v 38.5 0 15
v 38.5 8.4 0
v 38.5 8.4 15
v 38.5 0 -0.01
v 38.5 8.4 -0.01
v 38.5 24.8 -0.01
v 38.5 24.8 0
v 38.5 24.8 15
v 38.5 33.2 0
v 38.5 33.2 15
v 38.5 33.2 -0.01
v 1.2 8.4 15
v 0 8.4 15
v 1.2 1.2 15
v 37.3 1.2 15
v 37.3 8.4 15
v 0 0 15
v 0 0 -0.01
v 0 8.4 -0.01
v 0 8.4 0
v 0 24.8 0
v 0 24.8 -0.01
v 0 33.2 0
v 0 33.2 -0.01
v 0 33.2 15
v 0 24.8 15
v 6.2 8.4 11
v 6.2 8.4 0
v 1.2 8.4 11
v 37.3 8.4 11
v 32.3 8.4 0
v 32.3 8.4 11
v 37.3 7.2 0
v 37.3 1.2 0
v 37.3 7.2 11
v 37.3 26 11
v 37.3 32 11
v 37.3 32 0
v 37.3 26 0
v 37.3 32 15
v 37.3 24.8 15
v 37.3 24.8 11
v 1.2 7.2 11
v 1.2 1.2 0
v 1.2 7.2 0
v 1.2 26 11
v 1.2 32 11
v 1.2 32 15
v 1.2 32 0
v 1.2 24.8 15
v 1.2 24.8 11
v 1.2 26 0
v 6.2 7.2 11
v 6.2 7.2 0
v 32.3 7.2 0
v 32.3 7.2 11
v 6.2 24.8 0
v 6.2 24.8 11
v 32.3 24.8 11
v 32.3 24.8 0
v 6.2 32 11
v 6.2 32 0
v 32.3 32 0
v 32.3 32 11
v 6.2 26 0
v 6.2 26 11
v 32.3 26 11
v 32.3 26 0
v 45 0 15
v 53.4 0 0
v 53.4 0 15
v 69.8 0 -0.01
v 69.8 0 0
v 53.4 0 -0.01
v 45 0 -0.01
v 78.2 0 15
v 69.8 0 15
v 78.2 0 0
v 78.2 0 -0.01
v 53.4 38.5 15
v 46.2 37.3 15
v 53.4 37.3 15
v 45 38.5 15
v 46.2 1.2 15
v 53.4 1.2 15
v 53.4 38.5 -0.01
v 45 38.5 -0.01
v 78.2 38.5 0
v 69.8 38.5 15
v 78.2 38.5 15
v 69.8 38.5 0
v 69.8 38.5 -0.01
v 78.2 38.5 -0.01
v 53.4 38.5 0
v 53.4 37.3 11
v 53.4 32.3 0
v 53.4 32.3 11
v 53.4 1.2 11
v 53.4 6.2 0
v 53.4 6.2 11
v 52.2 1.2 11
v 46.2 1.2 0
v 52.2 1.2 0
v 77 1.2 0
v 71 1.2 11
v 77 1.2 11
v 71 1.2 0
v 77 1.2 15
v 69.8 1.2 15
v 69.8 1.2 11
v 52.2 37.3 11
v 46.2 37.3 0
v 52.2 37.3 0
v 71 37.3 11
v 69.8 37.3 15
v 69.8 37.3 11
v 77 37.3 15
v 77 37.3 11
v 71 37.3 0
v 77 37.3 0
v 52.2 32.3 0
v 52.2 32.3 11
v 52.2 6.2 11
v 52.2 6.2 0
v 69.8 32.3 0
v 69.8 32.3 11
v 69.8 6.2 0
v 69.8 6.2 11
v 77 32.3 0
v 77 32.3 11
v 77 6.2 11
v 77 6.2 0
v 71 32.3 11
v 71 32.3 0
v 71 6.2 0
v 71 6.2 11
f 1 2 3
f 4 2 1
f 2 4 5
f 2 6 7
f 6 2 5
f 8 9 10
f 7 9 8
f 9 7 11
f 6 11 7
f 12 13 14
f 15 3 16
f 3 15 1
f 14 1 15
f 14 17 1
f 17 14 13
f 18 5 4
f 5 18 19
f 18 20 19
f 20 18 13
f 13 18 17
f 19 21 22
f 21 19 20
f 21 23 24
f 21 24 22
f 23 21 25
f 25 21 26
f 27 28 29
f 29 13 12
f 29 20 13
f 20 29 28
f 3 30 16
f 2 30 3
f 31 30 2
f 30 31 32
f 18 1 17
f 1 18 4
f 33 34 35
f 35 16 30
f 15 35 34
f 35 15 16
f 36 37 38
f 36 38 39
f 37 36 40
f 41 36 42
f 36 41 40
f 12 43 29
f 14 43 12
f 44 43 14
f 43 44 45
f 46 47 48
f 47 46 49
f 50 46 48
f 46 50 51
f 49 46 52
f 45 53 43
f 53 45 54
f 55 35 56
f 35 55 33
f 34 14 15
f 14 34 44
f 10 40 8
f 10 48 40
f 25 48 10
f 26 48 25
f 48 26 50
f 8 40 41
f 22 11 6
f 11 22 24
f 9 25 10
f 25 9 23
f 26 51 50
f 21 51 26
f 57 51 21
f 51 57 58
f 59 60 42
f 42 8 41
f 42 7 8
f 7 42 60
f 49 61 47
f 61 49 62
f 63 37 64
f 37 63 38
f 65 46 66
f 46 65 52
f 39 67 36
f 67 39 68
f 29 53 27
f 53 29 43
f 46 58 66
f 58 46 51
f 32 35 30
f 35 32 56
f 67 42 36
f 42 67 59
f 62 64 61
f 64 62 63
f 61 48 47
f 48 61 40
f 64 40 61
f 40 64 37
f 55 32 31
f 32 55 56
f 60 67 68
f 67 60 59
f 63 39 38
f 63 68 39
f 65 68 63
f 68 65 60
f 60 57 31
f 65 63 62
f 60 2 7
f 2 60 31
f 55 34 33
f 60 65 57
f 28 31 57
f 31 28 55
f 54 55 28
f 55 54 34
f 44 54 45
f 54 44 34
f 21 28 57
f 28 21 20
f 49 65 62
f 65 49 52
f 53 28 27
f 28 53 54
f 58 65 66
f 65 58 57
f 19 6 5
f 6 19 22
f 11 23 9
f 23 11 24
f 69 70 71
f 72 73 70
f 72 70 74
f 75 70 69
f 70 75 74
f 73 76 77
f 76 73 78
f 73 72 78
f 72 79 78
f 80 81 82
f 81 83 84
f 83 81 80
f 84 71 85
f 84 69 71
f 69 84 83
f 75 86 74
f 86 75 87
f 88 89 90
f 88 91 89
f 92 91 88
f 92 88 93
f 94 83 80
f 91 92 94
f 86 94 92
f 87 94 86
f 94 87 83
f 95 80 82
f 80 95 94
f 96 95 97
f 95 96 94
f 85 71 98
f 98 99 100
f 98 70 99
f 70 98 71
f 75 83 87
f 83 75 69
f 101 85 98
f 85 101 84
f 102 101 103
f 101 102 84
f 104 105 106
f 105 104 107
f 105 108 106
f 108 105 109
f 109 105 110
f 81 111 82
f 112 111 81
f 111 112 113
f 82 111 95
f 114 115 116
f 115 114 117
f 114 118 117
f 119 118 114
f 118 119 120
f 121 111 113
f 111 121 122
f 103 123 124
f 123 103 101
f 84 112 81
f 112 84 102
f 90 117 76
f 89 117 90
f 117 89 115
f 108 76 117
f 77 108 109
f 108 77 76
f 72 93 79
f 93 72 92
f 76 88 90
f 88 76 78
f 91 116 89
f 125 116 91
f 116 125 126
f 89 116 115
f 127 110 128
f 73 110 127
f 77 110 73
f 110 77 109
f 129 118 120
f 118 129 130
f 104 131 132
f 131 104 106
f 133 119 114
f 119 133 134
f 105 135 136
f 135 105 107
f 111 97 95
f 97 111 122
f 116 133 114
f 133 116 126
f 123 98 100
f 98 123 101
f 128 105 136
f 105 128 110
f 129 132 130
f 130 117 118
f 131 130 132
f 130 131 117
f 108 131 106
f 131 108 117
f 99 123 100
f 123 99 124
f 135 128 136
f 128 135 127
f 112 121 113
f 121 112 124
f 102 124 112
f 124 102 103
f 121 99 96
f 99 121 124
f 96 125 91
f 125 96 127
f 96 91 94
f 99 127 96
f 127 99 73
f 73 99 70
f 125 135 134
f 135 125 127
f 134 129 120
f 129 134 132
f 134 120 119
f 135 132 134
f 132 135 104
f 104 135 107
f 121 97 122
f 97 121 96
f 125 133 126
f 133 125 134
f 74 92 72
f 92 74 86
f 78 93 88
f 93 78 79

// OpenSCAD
// file: ../../Base/Boxes.scad
// Fischertechnik Box Foundation
// Pre-designed Boxes

use <Constants.scad>

include <PlacementOptions.scad>

box190Width = 190;
box190Depth = 130;
box130Width = 130;
box130Depth = 95;
boxUsageHeight = 33.9;
boxWallThickness = 2.4;
boxBaseThickness = 1.0;

// getBoxWallThickness()
// Gets the wall thickness of a Fischertechnik Box

function getBoxWallThickness() = boxWallThickness;

// Gets the usable height of a fischertechnik box
function getBoxUsageHeight() = boxUsageHeight;

// Gets the thickness of the Fischertechnik box base.
function getBoxBaseThickness() = boxBaseThickness;

// Gets the usable inner space of a Box 190 as an x/y-list
function getBox190Space() = [
    box190Width - 2*getBoxWallThickness(), 
    box190Depth - 2*getBoxWallThickness() ];

// Imports the Fischertechnik empty box 130x190 mm and places it at position 0,0
// 190x130 are the outer sizes, the inner space is slightly smaller. Use getBox190Space() to get the inner sizes.
// This module needs the STL file "Fischertechnik Box 130x190.stl" in the library path.
// The box is positioned that the usable inner space is at the 0,0,0 position. The

module Box190() {
    translate([-getBoxWallThickness(),-getBoxWallThickness(),-getBoxBaseThickness()])
        import("Fischertechnik Box 130x190.stl", convexity=3);
}

// Gets the usable inner space of a Box 130 as an x/y-list
function getBox130Space() = [
    box130Width - 2*getBoxWallThickness(), 
    box130Depth - 2*getBoxWallThickness() ];

// Imports the Fischertechnik empty box 95x130 mm and places it at position 0,0
// 190x130 are the outer sizes, the inner space is slightly smaller. Use getBox190Space() to get the inner sizes.
// This module needs the STL file "Fischertechnik Box 95x130.stl" in the library path.
// The box is positioned that the usable inner space is at the 0,0,0 position. The

module Box130() {
    translate([-getBoxWallThickness(),-getBoxWallThickness(),-getBoxBaseThickness()])
        import("Fischertechnik Box 95x130.stl", convexity=3);
}

// Creates a web at the specified box walls
// corner 0 = LowerLeft, 1 = UpperLeft, 2 = UpperRight, 3 = LowerRight
// side 0 = LeftOfCorner, 1 = RightOfCorner
// distance = Distance in mm from the corner
// box = inner width and depth of the box (default: Box 190)
// webWidth = length of the web (default is 3 mms)
// webThickness = thickness of the web (default is 1 mm)

module BoxWeb(corner, side, distance, box=getBox190Space(), webWidth=3, webThickness=1.0) {
    sink = getBoxWallThickness()/2;

    width = (corner % 2 == 0) ? 
            (side == LeftOfCorner ? webWidth : webThickness) :
            (side == LeftOfCorner ? webThickness : webWidth);

    depth = (corner % 2 == 0) ? 
            (side == RightOfCorner ? webWidth : webThickness) :
            (side == RightOfCorner ? webThickness : webWidth);
    
    xDiff = corner == LowerLeft ? 
                (side == LeftOfCorner ? -sink : distance) :
            (corner == UpperLeft ?                
                (side == LeftOfCorner ? distance : -sink) :
            (corner == UpperRight ?
                (side == LeftOfCorner ? box.x-webWidth+sink : box.x-distance-webThickness) :
                (side == LeftOfCorner ? box.x-distance-webThickness: box.x-webWidth+sink)));

    yDiff = corner == LowerLeft ? 
                (side == RightOfCorner ? -sink : distance) :
            (corner == UpperLeft ?
                (side == RightOfCorner ? box.y-distance : box.y-webWidth+sink) :
            (corner == UpperRight ?
                (side == RightOfCorner ? box.y-webWidth+sink : box.y-distance) :
                (side == RightOfCorner ? distance : -sink)));
    
    translate([xDiff, yDiff, -getExcess()])
        cube([width, depth, boxUsageHeight + 2*getExcess()]);
}
// file: ../../Base/Rotation.scad
// Fischertechnik Box Foundation
// Geometry Helpers Rotation

include <PlacementOptions.scad>

// getRotatedSpace(space, rotation=NoRotation)
// Rotates the space dependent on the specified rotation

function getRotatedSpace(space, rotation=NoRotation) = [
    (rotation == Rotate90 || rotation == Rotate270) ? space.y : space.x,
    (rotation == Rotate90 || rotation == Rotate270) ? space.x : space.y
];

// Rotates the given space around the fixed left lower corner
// space = the space the children needs as width/depth list [width,depth]
// rotation = 0 Rotate0 degrees, 1 Rotate90 degrees, 2 Rotate180 degrees, 3 Rotate270 degrees (equivalent to -90)

module RotateFix(space, rotation=Rotate0) {
    dy = (rotation == Rotate0 || rotation == Rotate270) ? 0 :
        (rotation == Rotate90) ? space.x :
        space.y;
    dx = (rotation < Rotate180) ? 0 :
        (rotation == Rotate180) ? space.x :
        space.y;
    
    translate([dx, dy, 0])
        rotate([0, 0, rotations[rotation]])
            children();
}
// file: ../../Base/Alignment.scad
// Fischertechnik Box Foundation
// Geometry Helpers Alignment

include <PlacementOptions.scad>

// getAlignedX(elementWidth, spaceWidth, align=AlignRight, offset=0)
// Gets the aligned X offset of an element with the given
// width in the given space.
// elementWidth = The width of the element to positon
// spaceWidth = The space where the element should be aligned
// align = 0 AlignLeft, 1 AlignCenter, 2 AlignRight
// offset = an optional offset from the aligned position. When
// aligned left or centered, then positive values are in X direction.
// When aligned right then positive values are in negative X direction.

function getAlignedX(elementWidth, spaceWidth, align=AlignRight, offset=0) =
    (align == AlignLeft) ?
        offset :
        ((align == AlignCenter) ?
        (spaceWidth - elementWidth)/2 + offset :
        spaceWidth - offset - elementWidth);

// getAlignedY(elementDepth, spaceDepth, align=AlignTop, offset=0)
// Gets the aligned Y offset of an element with the given
// depth in the given space.
// elementDepth = The depth of the element to positon
// spaceDepth = The space where the element should be aligned
// align = 0 AlignBottom, 1 AlignCenter, 2 AlignTop
// offset = an optional offset from the aligned position. When
// aligned bottom or centered, then positive values are in Y direction.
// When aligned top then positive values are in negative Y direction.

function getAlignedY(elementDepth, spaceDepth, align=AlignTop, offset=0) =
    (align == AlignBottom) ?
        offset :
        ((align == AlignCenter) ?
        (spaceDepth - elementDepth)/2 + offset :
        spaceDepth - offset - elementDepth);
// file: ../../Base/Constants.scad
// Fischertechnik Box Foundation
// Constants

// Constant values necessary for multiple elements

// Base constants
dividerThickness = 1.2;
excess = 0.01;
fragments = 90;
tolerance = 0.8;

// Gets the thickness of a divider 
function getDividerThickness() = dividerThickness;

// Gets the excess that is used to merge walls into each other
function getExcess() = excess;

// Gets amount of fragments of a cylinder
function getFragments() = fragments;

// Gets the inner tolerance of a frame to each side
function getTolerance() = tolerance;


// Fischertechnik specific constants
axisDiameter = 4;
axisBottomDiameter = axisDiameter + 1;
standardEdgeDistance = 2.5;
standardWebDistance = 11.5;
standardCornerLength = 15;
tubeWallFactor = 1.6;

// Gets axis diameter
function getAxisDiameter() = axisDiameter;

// Gets axis bottom diameter for thicker part at the bottom
function getAxisBottomDiameter() = axisBottomDiameter;

// gets the standard distance to the wall of the box for dockable frames with webs
function getStandardEdgeDistance() = standardEdgeDistance;

// gets the standard distance of each web to the corner of the dockable frame
function getStandardWebDistance() = standardWebDistance;

// gets the standard length of the corner walls of a dockable frame
function getStandardCornerLength() = standardCornerLength;

// gets the wall thickness of a tube.
function getTubeWallThickness() = tubeWallFactor * getDividerThickness();
// file: ../../Base/PlacementOptions.scad
// Fischertechnik Box Foundation
// Placement Options

// Alignment
NoAlign = 0;
AlignLeft = 1;
AlignBottom = 2;
AlignCenter = 3;
AlignRight = 4;
AlignTop = 5;

// Element rotation degree steps
rotations = [0, -90, -180, -270];

// Rotation
NoRotation = 0;
Rotate0 = 0;
Rotate90 = 1;
Rotate180 = 2;
Rotate270 = 3;

// Docking (seen from above)
NoDock = -1;
DockLeft = 0;
DockTop = 1;
DockRight = 2;
DockCorner = 2;
DockBottom = 3;

// Web corners
LowerLeft = 0;
UpperLeft = 1;
UpperRight = 2;
LowerRight = 3;

// Web position relative to corner
LeftOfCorner = 0;
RightOfCorner = 1;
// file: ../../Elements/FrameConcaveMirror.scad
// Fischertechnik Box Library
// Frame for Concave Mirror
// 31369 

use <../Base/Constants.scad>
use <../ModelBase/Simple.scad>
use <../ModelBase/Complex.scad>

width = 35.3;
depth = 30;
height = 11;

// getFrameConcaveMirrorSpace()
// Gets the outer space the concave mirror frame needs.

function getFrameConcaveMirrorSpace() = getFrameOuterVolume([width, depth, height]);

// FrameConcaveMirror()
// Frame for 30 mm concave mirror.

module FrameConcaveMirror() {
    FrameSpecialFlat([width, depth, height]);
}

// Tests
color("lightgray") {
FrameConcaveMirror();
}
// file: ../../Base/Placement.scad
// Fischertechnik Box Foundation
// Geometry Helpers Placement

use <Constants.scad>
use <Alignment.scad>
use <Rotation.scad>
use <Boxes.scad>

include <PlacementOptions.scad>

// Place(x=0, y=0, elementSpace=[0,0], alignX=AlignLeft, alignY=AlignBottom, rotation=Rotate0, boxSpace=getBox190Space())
// Places the child at the specified position
// y = Y-Position. This is a relative position when an X aligment is specified.
// x = X-Position. This is a relative position when an Y aligment is specified.
// elementSpace = space of the element to be placed [x,y]
// alignX = -1=NoAlign, 0 AlignLeft, 1 AlignCenter, 3 AlignRight (elementSpace and boxSpace required!)
// alignY = -1=NoAlign, 2 AlignBottom, 1 AlignCenter, 4 AlignTop (elementSpace and boxSpace required!)
// rotation = 0 Rotate0 0 degrees, 1 Rotate90 90 degrees, 
// 2 Rotate180 180 degrees, 3 Rotate270 270 degrees (equivalent to -90)
// boxSpace = Inner space of the box where the placement occurs [x,y] - default is Box 190x130 inner space

module Place(x=0, y=0, elementSpace=[0,0], 
  alignX=AlignLeft, alignY=AlignBottom, 
  rotation=NoRotation, boxSpace=getBox190Space()) {

    module Position(x, y, space, rotation=Rotate0) {
        translate([x, y, 0])
            RotateFix(space, rotation)
                children(0);
    }

    space = getRotatedSpace(elementSpace, rotation);
    alignedX = getAlignedX(space.x, boxSpace.x, alignX, x);
    alignedY = getAlignedY(space.y, boxSpace.y, alignY, y);
    Position(alignedX, alignedY, elementSpace, rotation)
        children(0);
}

// Center(space=getBox130Space(), elementSpace=[0,0])
// space = Space where the children is centered. For cylinder use centered=true and no elementSpace.
// elementSpace = space of the element to be centered [x,y]

module Center(space=getBox190Space(), elementSpace=[0,0]) {
    translate([(space.x - elementSpace.x) / 2, (space.y - elementSpace.y) / 2])
        children(0);
}

// CenterHorizontal(width=0, y=0, offset=0, space=getBox130Space())
// space = Space where the children is centered. For cylinder use centered=true and no elementSpace.
// elementSpace = space of the element to be centered [x,y]

module CenterHorizontal(width=0, y=0, offset=0, space=getBox190Space()) {
    translate([(space.x - width) / 2 + offset, y])
        children(0);
}

// CenterVertical(depth=0, x=0, offset=0, space=getBox130Space())
// space = Space where the children is centered. For cylinder use centered=true and no elementSpace.
// elementSpace = space of the element to be centered [x,y]

module CenterVerticalal(depth=0, x=0, offset=0, space=getBox190Space()) {
    translate([x, (space.y - depth) / 2 + offset])
        children(0);
}
// main file
// Fischertechnik Box Foundation
// Elements
// Test FrameConcaveMirror

use <../../Base/Placement.scad>
use <../../Elements/FrameConcaveMirror.scad>

include <../../Base/PlacementOptions.scad>

FrameConcaveMirror();

Place(45, 0, elementSpace=getFrameConcaveMirrorSpace(), rotation=Rotate90)
    FrameConcaveMirror();
